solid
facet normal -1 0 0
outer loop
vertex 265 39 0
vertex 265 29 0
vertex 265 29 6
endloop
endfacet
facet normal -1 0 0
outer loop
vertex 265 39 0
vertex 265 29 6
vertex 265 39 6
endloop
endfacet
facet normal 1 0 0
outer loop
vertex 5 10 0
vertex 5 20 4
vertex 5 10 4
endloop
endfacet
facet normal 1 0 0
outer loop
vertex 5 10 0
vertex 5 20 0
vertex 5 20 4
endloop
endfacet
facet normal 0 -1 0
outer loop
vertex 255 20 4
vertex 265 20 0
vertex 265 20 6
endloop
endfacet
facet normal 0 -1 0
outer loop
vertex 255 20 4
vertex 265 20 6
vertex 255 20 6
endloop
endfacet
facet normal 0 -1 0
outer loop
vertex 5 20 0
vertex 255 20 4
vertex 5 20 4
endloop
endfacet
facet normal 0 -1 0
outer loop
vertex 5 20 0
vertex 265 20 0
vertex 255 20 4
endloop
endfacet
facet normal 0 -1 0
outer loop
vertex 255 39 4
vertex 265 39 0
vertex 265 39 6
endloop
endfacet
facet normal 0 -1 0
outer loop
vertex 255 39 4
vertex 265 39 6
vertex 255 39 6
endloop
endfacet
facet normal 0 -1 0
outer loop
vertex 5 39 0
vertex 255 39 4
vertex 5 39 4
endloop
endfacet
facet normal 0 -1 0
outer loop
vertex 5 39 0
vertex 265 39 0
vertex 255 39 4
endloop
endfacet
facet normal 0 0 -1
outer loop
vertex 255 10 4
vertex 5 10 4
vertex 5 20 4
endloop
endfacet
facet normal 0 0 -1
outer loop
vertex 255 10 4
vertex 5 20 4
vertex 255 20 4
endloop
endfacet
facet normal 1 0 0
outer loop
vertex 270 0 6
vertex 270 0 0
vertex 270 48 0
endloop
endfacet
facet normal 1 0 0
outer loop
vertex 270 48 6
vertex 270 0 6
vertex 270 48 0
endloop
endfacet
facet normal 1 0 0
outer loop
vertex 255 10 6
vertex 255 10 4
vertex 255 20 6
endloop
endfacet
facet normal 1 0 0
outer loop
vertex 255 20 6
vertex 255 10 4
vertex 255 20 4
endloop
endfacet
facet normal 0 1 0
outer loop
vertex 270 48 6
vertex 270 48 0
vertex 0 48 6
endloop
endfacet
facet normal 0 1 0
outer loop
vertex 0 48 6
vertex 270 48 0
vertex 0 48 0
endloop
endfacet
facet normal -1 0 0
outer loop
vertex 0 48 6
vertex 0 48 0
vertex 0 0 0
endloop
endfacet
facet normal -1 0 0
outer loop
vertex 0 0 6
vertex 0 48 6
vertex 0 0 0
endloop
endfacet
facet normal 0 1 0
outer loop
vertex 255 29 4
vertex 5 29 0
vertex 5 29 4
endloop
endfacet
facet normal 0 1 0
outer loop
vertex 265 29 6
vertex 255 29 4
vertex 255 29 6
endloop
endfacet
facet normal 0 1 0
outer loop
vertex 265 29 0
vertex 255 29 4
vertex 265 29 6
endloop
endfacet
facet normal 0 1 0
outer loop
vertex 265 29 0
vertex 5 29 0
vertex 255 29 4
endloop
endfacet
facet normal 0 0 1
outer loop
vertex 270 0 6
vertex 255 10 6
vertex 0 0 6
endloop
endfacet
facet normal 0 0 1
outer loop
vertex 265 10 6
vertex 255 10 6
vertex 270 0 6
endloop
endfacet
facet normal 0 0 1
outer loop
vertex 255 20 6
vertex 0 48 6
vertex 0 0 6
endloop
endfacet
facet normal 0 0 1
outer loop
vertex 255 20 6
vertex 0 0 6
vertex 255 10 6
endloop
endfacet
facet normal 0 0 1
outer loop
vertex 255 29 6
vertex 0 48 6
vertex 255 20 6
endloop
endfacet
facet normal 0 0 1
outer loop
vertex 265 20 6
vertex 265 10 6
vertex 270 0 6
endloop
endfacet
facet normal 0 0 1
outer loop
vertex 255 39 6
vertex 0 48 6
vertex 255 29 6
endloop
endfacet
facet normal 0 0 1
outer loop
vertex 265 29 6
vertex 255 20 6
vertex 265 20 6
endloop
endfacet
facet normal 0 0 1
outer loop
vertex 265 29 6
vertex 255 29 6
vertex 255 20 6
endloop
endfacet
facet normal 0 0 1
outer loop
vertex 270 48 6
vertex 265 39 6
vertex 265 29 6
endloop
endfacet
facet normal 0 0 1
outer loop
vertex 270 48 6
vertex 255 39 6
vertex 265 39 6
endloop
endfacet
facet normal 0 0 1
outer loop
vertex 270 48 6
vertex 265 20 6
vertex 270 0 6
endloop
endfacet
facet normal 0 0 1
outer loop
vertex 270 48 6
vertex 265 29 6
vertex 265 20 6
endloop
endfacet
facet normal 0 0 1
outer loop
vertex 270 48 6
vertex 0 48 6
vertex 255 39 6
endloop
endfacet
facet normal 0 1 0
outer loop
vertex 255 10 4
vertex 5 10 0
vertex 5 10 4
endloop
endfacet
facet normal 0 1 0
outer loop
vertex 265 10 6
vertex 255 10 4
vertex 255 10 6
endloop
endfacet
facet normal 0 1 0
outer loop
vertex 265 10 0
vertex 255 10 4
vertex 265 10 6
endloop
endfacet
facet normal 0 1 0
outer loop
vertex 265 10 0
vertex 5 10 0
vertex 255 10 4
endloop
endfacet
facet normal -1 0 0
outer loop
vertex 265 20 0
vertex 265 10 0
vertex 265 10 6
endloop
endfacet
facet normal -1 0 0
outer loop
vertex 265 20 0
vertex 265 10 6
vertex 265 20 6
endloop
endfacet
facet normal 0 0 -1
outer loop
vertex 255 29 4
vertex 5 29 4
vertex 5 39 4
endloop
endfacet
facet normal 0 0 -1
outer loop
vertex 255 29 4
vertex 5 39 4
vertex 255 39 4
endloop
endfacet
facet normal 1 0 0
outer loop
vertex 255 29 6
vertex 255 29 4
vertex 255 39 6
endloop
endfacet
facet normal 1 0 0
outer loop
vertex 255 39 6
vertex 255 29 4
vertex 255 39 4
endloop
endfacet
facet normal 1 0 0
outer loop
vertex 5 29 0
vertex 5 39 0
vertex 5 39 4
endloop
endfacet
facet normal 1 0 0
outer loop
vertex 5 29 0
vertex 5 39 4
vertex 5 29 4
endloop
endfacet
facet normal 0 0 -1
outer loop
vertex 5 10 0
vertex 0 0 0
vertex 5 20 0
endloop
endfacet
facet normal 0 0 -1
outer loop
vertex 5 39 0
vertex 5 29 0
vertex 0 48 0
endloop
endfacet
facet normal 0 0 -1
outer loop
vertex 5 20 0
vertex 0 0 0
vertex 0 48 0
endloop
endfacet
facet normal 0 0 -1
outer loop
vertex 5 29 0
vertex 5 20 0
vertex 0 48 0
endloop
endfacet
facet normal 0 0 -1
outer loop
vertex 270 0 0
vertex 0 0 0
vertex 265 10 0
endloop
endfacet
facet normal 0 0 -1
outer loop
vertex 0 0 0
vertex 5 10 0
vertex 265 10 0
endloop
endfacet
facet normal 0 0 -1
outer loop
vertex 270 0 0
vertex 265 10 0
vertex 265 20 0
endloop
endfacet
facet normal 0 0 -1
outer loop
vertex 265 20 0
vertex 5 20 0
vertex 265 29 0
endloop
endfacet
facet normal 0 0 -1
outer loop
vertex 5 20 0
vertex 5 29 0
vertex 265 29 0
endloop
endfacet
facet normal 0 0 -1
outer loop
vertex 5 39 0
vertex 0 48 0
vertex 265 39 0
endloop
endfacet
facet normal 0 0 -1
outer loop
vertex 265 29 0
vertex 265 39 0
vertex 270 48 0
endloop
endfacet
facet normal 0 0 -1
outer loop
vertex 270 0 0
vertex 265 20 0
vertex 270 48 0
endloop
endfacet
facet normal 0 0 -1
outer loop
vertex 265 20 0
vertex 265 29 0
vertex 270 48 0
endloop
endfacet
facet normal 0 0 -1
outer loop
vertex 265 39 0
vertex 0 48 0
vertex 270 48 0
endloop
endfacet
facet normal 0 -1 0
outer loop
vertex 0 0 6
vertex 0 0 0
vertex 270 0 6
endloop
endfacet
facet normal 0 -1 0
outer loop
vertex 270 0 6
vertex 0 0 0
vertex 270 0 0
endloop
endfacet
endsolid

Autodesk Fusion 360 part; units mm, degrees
sketch "Unsorted Smarties Top" plane through (0, 0, 0) normal (0, 0, 1) x (1, 0, 0)
  line L0 (0, 0) -> (270, 0)
  line L1 (270, 0) -> (270, 48)
  line L2 (270, 48) -> (0, 48)
  line L3 (0, 48) -> (0, 0)
  dimension "d1" = 270
  dimension "d2" = 48
extrude "Extrude1" add sketch "Unsorted Smarties Top" along normal blind 6
sketch "Sketch2" plane through (0, 0, 0) normal (0, 0, -1) x (1, 0, 0)
  line L0 (0, 0) -> (0, -48)
  line L1 (0, -48) -> (270, -48)
  line L2 (270, -48) -> (270, 0)
  line L3 (270, 0) -> (0, 0)
  line L4 (5, -10) -> (265, -10)
  line L5 (265, -10) -> (265, -20)
  line L6 (265, -20) -> (5, -20)
  line L7 (5, -20) -> (5, -10)
  line L8 (5, -29) -> (265, -29)
  line L9 (265, -29) -> (265, -39)
  line L10 (265, -39) -> (5, -39)
  line L11 (5, -39) -> (5, -29)
  dimension "d6" = 5
  dimension "d7" = 5
  dimension "d8" = 5
  dimension "d9" = 5
  dimension "d10" = 10
  dimension "d11" = 10
  dimension "d12" = 9
  dimension "d13" = 10
extrude "Extrude2" cut sketch "Sketch2" against normal blind 4 contours L4 L5 L6 L7 | L8 L9 L10 L11
sketch "Sketch3" plane through (0, 0, 4) normal (0, 0, -1) x (1, 0, 0)
  line L0 (5, -20) -> (265, -20)
  line L1 (265, -20) -> (265, -10)
  line L2 (265, -10) -> (5, -10)
  line L3 (5, -10) -> (5, -20)
  line L4 (265, -10) -> (255, -10)
  line L5 (255, -10) -> (255, -20)
  line L6 (255, -20) -> (265, -20)
  line L7 (265, -20) -> (265, -10)
  line L8 (265, -29) -> (255, -29)
  line L9 (255, -29) -> (255, -39)
  line L10 (255, -39) -> (265, -39)
  line L11 (265, -39) -> (265, -29)
extrude "Extrude3" cut sketch "Sketch3" against normal blind 2 contours L0 L1 L2 L4 L5 L6 L7 | L8 L9 L10 L11
equation "mdfThickness = 6 mm" comment "Thickness of the MDF fibre board"
equation "d4 = mdfThickness"
